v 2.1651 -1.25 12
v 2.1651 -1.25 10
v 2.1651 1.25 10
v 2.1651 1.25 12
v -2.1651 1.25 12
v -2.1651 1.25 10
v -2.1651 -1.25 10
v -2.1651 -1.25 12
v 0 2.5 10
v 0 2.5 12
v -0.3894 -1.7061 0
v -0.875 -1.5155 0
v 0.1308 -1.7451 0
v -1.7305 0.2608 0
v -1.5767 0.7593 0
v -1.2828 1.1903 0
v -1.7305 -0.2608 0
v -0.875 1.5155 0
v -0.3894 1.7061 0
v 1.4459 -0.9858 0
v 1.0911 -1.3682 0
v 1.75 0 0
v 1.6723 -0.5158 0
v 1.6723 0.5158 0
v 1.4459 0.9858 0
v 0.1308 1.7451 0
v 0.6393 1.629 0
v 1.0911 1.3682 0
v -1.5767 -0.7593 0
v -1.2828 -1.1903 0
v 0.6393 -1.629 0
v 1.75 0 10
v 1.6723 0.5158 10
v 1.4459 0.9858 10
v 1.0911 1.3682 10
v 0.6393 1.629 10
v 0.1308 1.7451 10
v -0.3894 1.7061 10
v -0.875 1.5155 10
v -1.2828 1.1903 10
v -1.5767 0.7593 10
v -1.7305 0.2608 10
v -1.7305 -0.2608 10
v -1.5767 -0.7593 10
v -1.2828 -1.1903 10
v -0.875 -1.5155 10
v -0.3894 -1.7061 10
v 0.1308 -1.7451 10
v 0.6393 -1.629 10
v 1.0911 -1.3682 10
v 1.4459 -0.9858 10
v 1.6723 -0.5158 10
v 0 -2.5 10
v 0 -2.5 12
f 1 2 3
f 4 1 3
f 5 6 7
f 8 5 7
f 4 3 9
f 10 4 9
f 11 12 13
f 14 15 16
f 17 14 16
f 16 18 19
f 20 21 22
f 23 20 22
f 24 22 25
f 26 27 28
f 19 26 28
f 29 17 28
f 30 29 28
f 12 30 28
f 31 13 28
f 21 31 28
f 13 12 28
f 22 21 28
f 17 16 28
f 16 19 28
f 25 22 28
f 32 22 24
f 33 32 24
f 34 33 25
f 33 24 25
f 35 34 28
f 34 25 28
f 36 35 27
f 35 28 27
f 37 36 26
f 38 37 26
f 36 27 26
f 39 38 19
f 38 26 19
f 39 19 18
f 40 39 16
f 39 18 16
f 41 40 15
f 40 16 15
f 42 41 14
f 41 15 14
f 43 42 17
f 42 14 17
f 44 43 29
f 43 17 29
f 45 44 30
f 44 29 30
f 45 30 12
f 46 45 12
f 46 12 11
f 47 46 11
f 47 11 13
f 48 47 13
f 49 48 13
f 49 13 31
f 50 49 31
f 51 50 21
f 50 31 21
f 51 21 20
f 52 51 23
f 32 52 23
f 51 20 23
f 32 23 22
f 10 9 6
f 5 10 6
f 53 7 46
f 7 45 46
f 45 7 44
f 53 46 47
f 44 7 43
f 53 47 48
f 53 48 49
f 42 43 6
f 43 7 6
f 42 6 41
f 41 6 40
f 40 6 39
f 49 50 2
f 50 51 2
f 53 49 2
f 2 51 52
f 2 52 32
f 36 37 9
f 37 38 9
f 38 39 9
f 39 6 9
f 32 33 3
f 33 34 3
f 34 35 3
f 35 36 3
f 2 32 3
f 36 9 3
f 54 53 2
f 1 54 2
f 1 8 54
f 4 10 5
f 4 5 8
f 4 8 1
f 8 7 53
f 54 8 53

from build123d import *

# Parameters (mm, degrees)
ESQUISSE1_R        = 1.75
BOSS_EXTRU_1_DEPTH = 10
BOSS_EXTRU_2_DEPTH = 2


with BuildPart() as part:
    # Esquisse1 → Boss.-Extru.1 (new body)
    with BuildSketch(Plane.XY):
        Circle(ESQUISSE1_R)
    extrude(amount=BOSS_EXTRU_1_DEPTH)

    # Esquisse2 → Boss.-Extru.2 (add)
    with BuildSketch(Plane.XY.offset(10)):
        Polygon((0, 2.5), (-2.165063509, 1.25), (-2.165063509, -1.25), (0, -2.5), (2.165063509, -1.25), (2.165063509, 1.25), align=None)
    extrude(amount=BOSS_EXTRU_2_DEPTH)


solid = part.part
